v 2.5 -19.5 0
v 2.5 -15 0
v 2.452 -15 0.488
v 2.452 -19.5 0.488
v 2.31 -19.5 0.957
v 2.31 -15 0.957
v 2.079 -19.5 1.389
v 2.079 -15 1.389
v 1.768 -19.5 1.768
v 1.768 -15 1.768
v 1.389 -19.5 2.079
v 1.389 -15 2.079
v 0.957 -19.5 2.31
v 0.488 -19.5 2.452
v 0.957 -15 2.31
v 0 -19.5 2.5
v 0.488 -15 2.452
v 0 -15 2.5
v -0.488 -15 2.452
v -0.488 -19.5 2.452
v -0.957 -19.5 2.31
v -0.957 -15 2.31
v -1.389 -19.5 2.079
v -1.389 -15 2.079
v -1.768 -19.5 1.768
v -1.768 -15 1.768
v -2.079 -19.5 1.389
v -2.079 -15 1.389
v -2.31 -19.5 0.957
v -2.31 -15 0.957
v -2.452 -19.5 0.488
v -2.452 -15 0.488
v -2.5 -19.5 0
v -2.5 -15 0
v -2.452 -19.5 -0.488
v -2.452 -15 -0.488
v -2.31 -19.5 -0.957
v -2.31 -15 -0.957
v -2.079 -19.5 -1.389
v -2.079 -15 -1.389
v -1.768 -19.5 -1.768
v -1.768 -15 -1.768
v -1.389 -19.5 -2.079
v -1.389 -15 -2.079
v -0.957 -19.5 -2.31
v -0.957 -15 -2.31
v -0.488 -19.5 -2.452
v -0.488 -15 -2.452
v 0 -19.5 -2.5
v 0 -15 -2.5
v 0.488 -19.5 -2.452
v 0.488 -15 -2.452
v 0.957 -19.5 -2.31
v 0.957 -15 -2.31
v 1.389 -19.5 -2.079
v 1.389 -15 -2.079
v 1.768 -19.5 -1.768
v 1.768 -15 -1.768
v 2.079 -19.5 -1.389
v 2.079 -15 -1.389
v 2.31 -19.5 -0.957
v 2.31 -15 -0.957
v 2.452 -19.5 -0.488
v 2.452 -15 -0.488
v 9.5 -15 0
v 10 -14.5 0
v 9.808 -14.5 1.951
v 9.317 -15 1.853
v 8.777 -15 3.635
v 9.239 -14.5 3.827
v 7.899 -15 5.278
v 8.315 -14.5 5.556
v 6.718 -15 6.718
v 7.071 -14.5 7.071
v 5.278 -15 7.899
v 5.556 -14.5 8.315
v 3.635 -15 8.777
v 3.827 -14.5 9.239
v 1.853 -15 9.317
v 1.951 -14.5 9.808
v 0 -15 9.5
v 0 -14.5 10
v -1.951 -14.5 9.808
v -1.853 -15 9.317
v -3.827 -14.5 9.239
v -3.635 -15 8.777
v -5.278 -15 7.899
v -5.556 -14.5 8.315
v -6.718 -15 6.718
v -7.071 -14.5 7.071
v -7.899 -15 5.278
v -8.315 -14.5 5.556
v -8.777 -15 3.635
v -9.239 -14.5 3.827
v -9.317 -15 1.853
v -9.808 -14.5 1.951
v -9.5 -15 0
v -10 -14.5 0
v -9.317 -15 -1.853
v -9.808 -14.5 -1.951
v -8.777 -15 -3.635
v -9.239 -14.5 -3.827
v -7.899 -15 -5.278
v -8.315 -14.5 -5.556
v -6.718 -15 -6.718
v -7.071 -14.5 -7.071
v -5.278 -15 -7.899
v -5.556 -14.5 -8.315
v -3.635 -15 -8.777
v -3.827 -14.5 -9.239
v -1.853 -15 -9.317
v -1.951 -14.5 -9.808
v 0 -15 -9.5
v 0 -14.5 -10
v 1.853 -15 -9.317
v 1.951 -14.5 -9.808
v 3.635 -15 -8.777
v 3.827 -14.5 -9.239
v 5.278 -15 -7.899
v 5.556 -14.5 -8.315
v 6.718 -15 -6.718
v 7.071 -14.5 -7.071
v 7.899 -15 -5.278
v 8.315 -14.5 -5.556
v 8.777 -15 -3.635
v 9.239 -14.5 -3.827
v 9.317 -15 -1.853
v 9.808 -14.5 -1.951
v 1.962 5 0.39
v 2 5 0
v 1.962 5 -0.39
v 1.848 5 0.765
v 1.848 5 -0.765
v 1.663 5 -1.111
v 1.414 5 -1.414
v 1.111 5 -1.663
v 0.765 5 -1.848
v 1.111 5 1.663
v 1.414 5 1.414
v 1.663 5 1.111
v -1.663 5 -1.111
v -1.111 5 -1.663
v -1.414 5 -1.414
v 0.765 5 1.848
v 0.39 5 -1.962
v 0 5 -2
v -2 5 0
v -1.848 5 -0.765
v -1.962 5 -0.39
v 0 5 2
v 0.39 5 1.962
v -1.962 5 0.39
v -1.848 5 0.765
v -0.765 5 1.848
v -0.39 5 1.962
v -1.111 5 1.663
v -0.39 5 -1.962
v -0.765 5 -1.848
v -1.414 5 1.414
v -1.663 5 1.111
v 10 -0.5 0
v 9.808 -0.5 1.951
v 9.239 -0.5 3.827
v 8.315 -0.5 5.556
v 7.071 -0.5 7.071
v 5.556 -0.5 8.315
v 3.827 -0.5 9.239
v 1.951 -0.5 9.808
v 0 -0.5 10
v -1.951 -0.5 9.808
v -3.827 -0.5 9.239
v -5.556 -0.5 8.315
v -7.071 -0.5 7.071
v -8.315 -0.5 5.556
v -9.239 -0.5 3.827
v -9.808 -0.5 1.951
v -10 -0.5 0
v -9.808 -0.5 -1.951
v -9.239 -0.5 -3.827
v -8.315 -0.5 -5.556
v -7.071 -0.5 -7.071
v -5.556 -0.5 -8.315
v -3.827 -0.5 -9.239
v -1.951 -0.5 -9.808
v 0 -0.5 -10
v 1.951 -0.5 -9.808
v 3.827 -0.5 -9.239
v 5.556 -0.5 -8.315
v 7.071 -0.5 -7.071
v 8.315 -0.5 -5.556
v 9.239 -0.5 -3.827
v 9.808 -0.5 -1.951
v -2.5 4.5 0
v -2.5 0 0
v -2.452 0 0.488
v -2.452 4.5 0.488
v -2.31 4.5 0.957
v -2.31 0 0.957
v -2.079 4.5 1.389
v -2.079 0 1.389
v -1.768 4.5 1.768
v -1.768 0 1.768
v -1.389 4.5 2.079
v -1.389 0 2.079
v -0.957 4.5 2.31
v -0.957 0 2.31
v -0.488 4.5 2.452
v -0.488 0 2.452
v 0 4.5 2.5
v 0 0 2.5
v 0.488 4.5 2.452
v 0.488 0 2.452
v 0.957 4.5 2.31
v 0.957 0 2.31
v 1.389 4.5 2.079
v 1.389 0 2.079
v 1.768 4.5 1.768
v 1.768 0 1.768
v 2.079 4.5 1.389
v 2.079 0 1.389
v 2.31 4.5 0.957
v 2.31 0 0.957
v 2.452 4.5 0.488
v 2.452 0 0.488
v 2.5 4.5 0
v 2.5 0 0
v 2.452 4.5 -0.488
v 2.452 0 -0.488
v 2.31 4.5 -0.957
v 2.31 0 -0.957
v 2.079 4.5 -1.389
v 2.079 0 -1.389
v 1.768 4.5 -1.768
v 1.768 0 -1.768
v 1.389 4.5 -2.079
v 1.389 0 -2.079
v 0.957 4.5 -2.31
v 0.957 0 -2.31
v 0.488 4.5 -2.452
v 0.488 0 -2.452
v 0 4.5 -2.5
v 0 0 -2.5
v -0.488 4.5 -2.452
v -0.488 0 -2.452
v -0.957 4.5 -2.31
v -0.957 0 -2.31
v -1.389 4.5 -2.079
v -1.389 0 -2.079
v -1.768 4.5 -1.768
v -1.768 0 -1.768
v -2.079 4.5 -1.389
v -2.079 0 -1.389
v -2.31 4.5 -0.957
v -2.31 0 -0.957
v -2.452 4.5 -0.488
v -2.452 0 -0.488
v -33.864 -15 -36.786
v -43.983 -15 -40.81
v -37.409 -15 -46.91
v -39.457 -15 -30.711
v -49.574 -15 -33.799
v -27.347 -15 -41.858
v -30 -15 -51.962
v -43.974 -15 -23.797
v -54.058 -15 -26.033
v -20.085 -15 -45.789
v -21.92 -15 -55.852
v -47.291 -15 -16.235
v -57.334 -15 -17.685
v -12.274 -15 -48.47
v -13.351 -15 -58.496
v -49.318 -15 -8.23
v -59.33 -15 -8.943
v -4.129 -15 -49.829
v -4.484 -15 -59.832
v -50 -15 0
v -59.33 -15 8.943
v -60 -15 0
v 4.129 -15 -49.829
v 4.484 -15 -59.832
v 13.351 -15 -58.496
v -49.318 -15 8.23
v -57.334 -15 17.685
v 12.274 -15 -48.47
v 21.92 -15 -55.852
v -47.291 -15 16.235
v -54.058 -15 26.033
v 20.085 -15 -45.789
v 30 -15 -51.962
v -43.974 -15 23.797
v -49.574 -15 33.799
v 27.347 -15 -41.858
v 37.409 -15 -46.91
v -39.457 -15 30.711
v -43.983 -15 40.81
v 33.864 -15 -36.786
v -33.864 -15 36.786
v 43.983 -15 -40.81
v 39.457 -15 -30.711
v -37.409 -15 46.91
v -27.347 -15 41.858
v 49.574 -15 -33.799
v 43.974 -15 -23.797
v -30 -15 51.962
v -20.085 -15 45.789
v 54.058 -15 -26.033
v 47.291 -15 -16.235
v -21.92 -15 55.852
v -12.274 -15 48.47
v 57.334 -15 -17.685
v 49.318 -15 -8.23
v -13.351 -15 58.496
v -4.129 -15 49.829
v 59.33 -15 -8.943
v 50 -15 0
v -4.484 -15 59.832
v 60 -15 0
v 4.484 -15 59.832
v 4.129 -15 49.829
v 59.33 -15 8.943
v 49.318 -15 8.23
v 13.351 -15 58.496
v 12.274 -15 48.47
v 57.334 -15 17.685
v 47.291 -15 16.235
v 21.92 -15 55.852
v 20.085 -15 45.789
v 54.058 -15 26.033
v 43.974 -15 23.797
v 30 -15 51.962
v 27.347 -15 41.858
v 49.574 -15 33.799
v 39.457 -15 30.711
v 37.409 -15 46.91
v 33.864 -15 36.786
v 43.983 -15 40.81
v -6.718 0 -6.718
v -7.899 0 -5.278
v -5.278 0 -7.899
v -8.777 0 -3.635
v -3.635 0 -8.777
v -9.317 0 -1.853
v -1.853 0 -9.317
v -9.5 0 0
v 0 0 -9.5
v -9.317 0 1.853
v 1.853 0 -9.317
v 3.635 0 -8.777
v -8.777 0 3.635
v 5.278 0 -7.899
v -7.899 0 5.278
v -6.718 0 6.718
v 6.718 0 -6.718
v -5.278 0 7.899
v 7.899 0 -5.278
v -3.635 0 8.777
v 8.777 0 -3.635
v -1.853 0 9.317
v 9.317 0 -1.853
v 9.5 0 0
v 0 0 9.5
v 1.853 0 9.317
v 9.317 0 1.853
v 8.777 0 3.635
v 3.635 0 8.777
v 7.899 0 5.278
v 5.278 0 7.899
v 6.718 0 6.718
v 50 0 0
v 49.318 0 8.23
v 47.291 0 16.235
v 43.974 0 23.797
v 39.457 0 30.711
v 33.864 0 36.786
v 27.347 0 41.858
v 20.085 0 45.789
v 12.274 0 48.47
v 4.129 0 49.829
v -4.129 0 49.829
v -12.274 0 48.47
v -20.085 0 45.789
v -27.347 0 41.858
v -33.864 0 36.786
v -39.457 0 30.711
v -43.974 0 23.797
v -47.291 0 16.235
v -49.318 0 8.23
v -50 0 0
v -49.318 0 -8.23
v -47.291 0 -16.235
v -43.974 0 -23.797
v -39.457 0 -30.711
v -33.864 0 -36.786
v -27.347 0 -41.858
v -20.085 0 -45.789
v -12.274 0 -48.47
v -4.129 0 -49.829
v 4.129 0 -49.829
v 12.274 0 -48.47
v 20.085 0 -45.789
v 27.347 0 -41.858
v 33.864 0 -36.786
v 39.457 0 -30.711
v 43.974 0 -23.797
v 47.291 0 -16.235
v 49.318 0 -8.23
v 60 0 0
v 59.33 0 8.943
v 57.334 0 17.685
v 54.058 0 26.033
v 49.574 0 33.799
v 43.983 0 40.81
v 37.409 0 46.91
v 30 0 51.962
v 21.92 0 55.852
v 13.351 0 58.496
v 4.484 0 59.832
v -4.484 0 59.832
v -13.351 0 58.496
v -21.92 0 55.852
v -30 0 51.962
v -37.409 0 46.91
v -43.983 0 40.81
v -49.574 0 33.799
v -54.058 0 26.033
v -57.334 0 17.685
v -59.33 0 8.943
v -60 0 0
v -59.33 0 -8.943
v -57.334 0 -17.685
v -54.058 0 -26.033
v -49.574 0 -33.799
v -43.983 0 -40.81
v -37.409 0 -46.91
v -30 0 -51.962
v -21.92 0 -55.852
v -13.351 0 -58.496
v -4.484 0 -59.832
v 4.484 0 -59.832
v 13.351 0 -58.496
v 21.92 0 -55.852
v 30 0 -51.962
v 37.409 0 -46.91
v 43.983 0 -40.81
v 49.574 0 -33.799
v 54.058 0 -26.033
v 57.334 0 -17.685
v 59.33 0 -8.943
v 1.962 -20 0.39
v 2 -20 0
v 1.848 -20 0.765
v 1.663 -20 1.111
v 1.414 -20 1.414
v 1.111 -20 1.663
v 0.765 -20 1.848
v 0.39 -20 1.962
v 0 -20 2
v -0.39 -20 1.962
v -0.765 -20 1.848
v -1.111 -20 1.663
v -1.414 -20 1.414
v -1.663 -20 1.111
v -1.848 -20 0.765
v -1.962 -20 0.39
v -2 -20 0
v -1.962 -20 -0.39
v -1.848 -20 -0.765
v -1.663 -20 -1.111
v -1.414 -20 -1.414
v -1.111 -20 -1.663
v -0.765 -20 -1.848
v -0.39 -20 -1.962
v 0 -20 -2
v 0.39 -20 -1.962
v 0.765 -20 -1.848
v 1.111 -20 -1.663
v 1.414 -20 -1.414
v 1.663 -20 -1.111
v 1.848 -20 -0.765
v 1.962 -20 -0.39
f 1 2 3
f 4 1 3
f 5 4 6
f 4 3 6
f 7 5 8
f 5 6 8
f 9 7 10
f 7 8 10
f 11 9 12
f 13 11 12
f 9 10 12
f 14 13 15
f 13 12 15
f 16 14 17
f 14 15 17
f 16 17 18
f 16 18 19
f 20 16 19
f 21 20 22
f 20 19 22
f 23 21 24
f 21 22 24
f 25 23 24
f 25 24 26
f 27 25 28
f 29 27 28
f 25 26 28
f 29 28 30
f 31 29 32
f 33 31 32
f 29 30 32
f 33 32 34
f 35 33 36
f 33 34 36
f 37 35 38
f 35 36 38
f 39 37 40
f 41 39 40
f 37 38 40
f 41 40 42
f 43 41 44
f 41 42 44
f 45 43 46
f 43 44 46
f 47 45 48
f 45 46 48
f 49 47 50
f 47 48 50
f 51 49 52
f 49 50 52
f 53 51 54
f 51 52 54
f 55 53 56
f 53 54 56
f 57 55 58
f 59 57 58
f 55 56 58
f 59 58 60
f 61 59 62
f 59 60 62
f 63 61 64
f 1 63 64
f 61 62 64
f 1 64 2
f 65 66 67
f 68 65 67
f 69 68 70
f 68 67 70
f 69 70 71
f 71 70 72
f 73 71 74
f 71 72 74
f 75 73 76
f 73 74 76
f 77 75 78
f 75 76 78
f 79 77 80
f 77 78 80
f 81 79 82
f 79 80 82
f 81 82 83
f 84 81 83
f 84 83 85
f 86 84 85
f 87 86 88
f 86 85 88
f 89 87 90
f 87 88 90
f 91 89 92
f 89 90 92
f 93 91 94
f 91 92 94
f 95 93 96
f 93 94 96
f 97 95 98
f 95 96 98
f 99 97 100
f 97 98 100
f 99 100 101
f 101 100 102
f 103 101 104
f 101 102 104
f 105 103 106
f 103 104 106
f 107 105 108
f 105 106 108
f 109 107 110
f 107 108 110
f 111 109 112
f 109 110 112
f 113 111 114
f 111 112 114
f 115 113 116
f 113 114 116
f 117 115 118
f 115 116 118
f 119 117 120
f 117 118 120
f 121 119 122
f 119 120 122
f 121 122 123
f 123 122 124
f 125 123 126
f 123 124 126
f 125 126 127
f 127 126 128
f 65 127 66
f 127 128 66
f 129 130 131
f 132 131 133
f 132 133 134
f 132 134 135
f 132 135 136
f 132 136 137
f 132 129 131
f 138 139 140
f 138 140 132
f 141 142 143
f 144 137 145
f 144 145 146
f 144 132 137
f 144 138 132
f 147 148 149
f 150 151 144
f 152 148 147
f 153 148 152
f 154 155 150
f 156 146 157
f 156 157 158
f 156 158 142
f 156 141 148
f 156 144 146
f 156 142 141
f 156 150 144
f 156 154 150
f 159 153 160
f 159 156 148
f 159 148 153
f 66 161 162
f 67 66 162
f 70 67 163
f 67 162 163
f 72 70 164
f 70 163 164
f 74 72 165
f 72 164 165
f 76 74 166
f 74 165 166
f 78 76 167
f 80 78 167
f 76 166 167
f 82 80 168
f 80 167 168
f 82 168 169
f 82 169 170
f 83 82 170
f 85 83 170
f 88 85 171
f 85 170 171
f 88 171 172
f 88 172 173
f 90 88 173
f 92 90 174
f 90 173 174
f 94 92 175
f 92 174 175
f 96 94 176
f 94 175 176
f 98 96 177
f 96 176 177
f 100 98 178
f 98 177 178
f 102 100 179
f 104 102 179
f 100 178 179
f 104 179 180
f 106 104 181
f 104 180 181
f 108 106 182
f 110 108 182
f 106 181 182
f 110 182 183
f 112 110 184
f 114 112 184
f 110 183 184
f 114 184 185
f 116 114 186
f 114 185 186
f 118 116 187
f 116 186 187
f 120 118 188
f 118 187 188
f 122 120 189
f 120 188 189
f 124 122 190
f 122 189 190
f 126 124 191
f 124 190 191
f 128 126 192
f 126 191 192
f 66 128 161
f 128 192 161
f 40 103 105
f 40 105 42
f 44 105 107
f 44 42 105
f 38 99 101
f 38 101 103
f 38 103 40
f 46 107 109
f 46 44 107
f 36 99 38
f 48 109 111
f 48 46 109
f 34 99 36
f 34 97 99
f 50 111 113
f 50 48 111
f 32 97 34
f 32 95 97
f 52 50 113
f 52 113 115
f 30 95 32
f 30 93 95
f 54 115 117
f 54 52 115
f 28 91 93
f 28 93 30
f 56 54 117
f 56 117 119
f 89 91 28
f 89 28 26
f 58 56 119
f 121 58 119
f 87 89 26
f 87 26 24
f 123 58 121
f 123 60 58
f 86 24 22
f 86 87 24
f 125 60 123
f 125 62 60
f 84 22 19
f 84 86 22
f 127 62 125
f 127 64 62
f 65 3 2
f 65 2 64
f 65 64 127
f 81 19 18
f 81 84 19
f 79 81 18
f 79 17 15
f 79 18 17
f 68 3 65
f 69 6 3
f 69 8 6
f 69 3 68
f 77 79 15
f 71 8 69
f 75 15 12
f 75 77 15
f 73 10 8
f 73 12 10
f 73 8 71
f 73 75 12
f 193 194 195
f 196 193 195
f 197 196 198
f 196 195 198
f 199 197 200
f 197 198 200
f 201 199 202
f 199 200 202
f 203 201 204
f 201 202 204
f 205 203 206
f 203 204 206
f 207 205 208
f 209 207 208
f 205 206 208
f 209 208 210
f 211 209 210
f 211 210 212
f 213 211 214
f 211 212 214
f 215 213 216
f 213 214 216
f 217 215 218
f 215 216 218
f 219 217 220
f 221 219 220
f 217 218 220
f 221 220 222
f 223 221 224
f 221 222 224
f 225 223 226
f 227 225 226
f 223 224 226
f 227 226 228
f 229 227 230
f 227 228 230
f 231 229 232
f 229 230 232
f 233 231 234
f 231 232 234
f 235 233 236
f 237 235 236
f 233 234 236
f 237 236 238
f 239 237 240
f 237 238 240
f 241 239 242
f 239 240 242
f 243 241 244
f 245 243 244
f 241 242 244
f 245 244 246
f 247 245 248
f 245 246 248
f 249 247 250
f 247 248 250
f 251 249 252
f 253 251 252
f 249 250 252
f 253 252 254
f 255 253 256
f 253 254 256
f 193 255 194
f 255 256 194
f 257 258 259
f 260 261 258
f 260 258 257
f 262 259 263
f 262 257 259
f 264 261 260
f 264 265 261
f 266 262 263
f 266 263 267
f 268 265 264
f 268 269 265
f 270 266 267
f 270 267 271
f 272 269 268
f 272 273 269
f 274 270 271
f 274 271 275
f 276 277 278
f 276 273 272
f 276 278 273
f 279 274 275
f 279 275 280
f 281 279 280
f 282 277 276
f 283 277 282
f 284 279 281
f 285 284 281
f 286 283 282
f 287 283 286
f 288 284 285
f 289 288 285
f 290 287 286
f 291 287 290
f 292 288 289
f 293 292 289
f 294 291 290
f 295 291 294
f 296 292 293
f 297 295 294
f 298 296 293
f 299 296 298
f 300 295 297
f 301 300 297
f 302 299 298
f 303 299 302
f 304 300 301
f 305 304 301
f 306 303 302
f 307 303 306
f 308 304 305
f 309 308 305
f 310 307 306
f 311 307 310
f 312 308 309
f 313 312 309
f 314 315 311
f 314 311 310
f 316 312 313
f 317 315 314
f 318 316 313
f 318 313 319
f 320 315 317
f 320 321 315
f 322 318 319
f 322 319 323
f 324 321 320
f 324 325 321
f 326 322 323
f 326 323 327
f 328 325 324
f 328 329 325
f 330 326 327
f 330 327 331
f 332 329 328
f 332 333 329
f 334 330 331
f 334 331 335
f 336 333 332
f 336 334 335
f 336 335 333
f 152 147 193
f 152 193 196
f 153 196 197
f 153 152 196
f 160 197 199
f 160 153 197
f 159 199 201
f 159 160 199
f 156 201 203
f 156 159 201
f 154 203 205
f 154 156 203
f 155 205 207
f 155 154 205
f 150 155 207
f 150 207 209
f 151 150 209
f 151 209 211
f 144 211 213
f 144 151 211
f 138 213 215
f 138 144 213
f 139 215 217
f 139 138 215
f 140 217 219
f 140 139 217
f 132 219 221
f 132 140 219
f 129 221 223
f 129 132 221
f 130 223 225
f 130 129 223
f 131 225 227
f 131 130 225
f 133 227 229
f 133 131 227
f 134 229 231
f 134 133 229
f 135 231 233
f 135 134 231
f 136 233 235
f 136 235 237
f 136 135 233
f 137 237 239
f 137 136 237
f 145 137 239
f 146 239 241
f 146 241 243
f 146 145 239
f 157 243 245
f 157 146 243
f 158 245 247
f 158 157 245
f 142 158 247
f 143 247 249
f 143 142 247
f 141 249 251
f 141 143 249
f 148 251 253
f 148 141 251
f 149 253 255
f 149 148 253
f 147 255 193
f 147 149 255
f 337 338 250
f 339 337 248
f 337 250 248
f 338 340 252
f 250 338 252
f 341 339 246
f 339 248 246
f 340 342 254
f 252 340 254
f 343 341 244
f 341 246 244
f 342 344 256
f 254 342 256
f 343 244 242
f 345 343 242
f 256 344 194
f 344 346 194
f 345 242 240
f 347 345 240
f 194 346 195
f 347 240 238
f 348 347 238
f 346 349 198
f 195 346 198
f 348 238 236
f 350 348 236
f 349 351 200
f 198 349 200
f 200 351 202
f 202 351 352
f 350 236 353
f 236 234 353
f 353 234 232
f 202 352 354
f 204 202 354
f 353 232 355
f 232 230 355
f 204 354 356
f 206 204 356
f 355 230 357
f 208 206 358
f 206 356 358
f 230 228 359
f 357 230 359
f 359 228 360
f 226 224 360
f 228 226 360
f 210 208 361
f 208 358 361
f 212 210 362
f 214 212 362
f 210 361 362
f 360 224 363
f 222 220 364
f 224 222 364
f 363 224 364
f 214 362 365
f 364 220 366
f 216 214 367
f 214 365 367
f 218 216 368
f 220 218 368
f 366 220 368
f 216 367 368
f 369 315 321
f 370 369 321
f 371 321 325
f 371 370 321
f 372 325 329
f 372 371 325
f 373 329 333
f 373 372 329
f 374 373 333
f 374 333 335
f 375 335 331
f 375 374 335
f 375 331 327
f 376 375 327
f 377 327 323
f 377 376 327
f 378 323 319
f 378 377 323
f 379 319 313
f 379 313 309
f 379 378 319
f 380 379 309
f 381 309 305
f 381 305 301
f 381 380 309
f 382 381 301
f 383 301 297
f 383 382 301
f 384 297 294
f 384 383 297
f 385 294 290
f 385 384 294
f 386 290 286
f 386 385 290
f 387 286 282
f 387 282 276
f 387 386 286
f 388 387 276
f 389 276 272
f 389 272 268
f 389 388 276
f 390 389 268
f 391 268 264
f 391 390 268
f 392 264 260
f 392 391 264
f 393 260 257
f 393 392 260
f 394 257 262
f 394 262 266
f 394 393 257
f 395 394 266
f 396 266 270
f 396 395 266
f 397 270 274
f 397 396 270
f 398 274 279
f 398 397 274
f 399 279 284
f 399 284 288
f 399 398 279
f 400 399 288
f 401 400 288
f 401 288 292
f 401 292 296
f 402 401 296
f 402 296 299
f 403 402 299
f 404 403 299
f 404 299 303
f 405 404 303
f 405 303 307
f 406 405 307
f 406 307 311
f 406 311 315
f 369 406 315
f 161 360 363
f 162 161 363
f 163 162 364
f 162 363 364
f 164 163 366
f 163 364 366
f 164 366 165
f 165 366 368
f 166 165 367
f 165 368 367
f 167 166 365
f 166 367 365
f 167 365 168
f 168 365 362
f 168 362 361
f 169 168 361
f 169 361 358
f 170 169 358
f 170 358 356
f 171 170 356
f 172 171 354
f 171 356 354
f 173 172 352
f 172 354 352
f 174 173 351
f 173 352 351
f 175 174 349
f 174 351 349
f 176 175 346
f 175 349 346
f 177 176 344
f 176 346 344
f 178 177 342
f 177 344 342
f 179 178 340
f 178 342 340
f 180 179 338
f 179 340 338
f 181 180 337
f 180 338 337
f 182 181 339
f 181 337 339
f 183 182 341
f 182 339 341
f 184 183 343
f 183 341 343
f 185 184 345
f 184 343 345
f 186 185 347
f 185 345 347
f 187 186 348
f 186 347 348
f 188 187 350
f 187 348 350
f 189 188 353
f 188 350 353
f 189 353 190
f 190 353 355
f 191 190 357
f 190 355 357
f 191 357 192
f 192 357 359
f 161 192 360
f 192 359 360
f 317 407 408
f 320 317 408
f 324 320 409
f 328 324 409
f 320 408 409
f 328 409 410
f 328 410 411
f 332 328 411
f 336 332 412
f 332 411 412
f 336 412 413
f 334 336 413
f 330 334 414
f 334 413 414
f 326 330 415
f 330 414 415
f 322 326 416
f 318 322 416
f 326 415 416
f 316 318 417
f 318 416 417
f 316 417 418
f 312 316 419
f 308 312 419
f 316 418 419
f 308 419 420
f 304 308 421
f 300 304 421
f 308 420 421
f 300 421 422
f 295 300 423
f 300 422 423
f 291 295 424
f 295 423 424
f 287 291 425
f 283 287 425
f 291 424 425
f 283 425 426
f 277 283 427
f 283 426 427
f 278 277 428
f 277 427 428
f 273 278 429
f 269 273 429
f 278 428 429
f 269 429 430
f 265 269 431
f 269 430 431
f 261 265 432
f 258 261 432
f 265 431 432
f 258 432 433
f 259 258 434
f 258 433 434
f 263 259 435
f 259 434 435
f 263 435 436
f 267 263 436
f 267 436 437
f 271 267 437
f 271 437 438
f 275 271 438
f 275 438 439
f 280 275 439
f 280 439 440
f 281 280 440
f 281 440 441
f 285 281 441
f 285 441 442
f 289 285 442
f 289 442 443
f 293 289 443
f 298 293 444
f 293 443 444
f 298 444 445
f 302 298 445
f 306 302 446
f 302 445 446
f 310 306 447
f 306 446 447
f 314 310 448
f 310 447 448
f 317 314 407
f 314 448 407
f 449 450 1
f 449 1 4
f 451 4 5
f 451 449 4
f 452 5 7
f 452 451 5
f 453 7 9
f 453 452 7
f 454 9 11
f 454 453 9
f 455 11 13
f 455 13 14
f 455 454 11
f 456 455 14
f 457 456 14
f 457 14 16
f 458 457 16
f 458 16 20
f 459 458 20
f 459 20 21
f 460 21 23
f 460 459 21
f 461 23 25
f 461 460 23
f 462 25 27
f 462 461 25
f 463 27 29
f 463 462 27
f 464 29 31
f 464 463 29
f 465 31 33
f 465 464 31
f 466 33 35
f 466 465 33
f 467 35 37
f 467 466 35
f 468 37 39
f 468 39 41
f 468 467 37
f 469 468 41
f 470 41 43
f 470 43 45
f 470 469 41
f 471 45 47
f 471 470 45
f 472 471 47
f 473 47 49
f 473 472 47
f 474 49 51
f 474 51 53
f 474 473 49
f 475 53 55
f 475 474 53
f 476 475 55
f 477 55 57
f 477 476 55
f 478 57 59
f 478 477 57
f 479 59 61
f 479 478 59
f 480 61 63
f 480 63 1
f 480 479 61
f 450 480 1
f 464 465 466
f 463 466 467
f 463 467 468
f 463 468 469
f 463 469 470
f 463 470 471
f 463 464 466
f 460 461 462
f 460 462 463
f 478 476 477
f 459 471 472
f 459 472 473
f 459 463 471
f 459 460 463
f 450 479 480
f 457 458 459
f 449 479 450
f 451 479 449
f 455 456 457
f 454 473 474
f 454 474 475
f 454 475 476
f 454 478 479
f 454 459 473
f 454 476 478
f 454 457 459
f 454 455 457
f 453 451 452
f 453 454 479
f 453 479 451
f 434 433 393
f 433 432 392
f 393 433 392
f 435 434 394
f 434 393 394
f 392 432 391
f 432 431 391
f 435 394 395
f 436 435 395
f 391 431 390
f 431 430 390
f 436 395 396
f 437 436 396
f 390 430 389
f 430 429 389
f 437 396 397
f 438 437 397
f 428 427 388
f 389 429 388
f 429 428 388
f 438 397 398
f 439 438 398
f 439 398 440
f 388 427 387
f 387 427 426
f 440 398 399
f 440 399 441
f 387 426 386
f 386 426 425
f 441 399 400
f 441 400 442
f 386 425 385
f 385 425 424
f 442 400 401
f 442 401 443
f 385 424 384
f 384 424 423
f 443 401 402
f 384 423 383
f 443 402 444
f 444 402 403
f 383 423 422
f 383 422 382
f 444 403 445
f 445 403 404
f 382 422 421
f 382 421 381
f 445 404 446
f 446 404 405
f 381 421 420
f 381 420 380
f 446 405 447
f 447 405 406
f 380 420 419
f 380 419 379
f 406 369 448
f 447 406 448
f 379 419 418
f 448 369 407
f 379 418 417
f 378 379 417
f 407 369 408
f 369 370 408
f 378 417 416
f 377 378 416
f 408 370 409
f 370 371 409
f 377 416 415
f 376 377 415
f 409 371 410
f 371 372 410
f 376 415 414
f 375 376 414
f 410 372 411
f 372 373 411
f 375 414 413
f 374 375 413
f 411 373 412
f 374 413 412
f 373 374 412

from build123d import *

# Parameters (mm, degrees)
F0_R     = 60
F0_R_2   = 50
F1_DEPTH = 15
F0_R_3   = 10
F2_R     = 2.5
F3_DEPTH = 5
F4_R     = 2.5
F5_DEPTH = 5
F6_SIZE  = 0.5
F7_SIZE  = 0.5
F8_SIZE  = 0.5


# Not quite as in the source:
# - a feature names something its author has since deleted; it is built from what else it names


with BuildPart() as f1:
    # F0 (on Front) → F1 (new body)
    with BuildSketch(Plane.XZ):
        Circle(F0_R)
        Circle(F0_R_2, mode=Mode.SUBTRACT)
    extrude(amount=F1_DEPTH)


with BuildPart() as f1b:
    # F0 (on Front) → F1, piece 2 (new body)
    with BuildSketch(Plane.XZ):
        Circle(F0_R_3)
    extrude(amount=F1_DEPTH)

    # F2 (on face) → F3 (join)
    with BuildSketch(Plane.XZ.offset(15)):
        Circle(F2_R)
    extrude(amount=F3_DEPTH)

    # F4 (on face) → F5 (join)
    with BuildSketch(Plane(origin=(0, 0, 0), x_dir=(-1, 0, 0), z_dir=(0, 1, 0))):
        Circle(F4_R)
    extrude(amount=F5_DEPTH)

    # F6
    f6_edges = [f1b.edges().sort_by_distance(p)[0] for p in [
        (-2.5, -20, 0),
    ]]
    chamfer(f6_edges, length=F6_SIZE)

    # F7
    f7_edges = [f1b.edges().sort_by_distance(p)[0] for p in [
        (10, -7.5, 0),
        (-10, 0, 0),
        (-10, -15, 0),
    ]]
    chamfer(f7_edges, length=F7_SIZE)

    # F8
    f8_edges = [f1b.edges().sort_by_distance(p)[0] for p in [
        (2.5, 5, 0),
    ]]
    chamfer(f8_edges, length=F8_SIZE)


solid = Compound([f1.part, f1b.part])
